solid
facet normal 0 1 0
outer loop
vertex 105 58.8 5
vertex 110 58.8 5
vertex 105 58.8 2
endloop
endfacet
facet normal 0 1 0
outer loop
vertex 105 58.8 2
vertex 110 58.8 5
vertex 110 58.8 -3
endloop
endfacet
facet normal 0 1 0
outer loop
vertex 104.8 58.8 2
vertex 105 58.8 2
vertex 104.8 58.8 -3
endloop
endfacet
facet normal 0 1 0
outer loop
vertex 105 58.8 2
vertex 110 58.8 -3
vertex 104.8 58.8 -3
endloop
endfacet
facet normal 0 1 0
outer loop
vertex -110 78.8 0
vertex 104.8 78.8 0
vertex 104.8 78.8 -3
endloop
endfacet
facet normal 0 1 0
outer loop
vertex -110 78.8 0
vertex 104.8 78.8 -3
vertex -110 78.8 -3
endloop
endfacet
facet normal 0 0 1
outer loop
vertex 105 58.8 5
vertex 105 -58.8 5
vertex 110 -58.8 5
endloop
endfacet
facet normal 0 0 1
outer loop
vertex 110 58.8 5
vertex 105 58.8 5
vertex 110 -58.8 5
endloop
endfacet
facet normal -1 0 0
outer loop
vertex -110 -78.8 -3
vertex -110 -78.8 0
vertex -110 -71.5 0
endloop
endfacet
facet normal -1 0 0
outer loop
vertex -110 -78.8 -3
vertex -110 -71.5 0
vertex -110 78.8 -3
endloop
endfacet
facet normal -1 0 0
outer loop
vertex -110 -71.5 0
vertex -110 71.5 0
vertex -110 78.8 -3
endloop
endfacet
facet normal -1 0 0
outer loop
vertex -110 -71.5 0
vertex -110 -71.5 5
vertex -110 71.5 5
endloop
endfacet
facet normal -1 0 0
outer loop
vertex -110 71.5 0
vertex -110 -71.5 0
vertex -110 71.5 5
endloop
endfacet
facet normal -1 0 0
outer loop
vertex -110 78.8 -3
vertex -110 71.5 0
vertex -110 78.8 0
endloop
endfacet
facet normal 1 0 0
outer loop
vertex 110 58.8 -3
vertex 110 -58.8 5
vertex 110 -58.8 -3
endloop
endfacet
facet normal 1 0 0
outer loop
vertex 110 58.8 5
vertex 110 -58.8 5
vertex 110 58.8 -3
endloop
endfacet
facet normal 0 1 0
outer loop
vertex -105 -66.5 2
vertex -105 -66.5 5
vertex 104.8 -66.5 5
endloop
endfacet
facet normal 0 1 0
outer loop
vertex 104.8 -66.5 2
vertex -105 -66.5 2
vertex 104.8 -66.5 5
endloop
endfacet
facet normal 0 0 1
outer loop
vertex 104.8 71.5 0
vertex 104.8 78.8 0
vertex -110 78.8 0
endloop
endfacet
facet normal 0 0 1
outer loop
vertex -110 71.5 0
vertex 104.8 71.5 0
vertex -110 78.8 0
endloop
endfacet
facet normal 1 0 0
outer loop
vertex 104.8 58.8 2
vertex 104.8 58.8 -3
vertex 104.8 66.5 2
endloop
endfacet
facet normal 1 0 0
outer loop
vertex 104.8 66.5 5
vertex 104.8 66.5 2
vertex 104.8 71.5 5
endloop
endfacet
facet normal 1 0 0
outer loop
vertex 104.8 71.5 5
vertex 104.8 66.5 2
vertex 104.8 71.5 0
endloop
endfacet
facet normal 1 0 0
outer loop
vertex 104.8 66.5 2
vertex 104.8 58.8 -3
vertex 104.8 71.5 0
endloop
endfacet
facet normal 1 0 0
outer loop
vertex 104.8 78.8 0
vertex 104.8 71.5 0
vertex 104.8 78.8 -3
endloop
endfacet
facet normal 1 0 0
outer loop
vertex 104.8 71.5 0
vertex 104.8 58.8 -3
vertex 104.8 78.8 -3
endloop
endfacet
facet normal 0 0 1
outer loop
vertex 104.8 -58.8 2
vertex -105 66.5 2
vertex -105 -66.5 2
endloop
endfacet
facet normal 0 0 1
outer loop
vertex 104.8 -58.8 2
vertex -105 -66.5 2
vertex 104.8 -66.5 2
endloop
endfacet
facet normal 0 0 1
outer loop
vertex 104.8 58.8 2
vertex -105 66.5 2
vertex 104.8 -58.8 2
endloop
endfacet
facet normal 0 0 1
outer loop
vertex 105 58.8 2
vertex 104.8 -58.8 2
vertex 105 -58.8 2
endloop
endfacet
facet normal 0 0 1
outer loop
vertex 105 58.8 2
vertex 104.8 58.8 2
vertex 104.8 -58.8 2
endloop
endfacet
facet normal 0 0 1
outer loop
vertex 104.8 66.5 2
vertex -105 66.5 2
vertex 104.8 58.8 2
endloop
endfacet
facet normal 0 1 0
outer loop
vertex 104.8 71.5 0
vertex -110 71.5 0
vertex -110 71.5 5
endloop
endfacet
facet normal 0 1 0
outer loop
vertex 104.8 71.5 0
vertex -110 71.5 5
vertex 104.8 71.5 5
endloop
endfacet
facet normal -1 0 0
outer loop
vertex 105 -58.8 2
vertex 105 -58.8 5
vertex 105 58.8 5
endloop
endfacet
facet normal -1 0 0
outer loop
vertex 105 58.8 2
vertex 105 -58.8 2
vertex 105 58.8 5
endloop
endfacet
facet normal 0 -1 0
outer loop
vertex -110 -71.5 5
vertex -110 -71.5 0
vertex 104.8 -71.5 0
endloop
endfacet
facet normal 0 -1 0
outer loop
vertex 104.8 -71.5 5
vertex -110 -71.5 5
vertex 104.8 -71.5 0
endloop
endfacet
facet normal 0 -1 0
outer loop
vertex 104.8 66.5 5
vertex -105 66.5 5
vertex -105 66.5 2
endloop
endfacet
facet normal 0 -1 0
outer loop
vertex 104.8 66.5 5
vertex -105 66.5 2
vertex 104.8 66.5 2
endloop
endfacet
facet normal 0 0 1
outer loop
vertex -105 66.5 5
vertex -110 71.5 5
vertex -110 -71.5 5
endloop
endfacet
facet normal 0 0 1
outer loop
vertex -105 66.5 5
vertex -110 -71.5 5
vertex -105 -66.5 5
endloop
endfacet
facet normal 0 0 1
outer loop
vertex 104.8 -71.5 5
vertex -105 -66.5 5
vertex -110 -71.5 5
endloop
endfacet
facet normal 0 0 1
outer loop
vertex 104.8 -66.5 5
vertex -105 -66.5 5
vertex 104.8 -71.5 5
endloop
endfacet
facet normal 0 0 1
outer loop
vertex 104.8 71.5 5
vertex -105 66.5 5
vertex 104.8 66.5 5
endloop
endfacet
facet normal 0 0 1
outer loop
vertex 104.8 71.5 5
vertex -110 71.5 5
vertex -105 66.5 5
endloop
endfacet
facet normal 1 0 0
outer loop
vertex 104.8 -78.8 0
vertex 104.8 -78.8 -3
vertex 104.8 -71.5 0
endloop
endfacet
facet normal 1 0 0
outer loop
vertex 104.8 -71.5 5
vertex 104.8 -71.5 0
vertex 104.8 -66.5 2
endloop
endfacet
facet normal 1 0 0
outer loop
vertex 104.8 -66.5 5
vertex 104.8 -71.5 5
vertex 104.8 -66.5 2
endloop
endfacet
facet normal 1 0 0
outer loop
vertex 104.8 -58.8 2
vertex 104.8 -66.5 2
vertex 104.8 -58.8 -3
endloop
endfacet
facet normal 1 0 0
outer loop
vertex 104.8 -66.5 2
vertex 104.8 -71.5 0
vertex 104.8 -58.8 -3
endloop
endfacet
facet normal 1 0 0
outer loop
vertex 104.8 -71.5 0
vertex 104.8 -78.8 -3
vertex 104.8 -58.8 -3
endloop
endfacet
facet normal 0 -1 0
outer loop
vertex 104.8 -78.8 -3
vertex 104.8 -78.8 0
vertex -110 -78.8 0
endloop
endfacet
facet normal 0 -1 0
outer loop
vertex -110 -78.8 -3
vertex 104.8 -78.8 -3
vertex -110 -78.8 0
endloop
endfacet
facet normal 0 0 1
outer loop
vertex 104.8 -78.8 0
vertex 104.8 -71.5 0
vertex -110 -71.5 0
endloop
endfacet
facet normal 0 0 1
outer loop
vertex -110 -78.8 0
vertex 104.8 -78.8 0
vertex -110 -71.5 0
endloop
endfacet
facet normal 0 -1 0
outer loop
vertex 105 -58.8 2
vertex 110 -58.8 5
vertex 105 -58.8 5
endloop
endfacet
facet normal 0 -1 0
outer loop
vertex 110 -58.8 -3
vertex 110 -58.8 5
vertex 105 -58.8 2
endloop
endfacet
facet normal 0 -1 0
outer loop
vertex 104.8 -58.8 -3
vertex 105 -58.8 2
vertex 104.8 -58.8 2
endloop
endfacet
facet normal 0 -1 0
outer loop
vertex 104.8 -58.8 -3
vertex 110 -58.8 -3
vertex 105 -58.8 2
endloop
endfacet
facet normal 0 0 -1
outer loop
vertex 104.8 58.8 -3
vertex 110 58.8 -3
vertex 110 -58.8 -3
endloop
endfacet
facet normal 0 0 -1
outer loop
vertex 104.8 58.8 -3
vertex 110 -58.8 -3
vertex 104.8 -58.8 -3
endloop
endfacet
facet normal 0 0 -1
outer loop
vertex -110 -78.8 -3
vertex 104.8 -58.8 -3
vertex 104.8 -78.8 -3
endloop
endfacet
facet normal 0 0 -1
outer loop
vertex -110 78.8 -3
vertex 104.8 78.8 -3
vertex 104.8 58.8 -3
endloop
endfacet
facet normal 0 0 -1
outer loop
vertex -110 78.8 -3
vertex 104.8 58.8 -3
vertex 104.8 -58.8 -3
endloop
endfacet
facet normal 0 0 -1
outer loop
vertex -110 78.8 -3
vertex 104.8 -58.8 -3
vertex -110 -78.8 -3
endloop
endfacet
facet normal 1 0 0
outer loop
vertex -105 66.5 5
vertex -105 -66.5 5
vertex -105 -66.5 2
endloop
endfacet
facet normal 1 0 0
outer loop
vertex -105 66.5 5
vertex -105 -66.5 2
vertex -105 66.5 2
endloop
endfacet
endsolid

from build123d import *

# Parameters (mm, degrees)
CROQUIS1_W              = 220
CROQUIS1_H              = 143
SALIENTE_EXTRUIR1_DEPTH = 5
CROQUIS2_W              = 210
CROQUIS2_H              = 133
CORTAR_EXTRUIR1_DEPTH   = 3
CROQUIS3_W              = 220
CROQUIS3_H              = 157.6
SALIENTE_EXTRUIR2_DEPTH = 3
CROQUIS4_W              = 5.2
CROQUIS4_H              = 20
CORTAR_EXTRUIR2_DEPTH   = 136.548662848


with BuildPart() as part:
    # Croquis1 → Saliente-Extruir1 (new body)
    with BuildSketch(Plane.XY):
        Rectangle(CROQUIS1_W, CROQUIS1_H)
    extrude(amount=SALIENTE_EXTRUIR1_DEPTH)

    # Croquis2 → Cortar-Extruir1 (cut)
    with BuildSketch(Plane.XY.offset(5)):
        Rectangle(CROQUIS2_W, CROQUIS2_H)
    extrude(amount=-CORTAR_EXTRUIR1_DEPTH, mode=Mode.SUBTRACT)

    # Croquis3 → Saliente-Extruir2 (add)
    with BuildSketch(Plane(origin=(0, 0, 0), x_dir=(-1, 0, 0), z_dir=(0, 0, -1))):
        Rectangle(CROQUIS3_W, CROQUIS3_H)
    extrude(amount=SALIENTE_EXTRUIR2_DEPTH)

    # Croquis4 → Cortar-Extruir2 (cut, through all)
    with BuildSketch(Plane(origin=(0, 0, -3), x_dir=(-1, 0, 0), z_dir=(0, 0, -1))):
        with Locations((-107.4, 68.8)):
            Rectangle(CROQUIS4_W, CROQUIS4_H)
        with Locations((-107.4, -68.8)):
            Rectangle(CROQUIS4_W, CROQUIS4_H)
    extrude(amount=-CORTAR_EXTRUIR2_DEPTH, mode=Mode.SUBTRACT)


solid = part.part
